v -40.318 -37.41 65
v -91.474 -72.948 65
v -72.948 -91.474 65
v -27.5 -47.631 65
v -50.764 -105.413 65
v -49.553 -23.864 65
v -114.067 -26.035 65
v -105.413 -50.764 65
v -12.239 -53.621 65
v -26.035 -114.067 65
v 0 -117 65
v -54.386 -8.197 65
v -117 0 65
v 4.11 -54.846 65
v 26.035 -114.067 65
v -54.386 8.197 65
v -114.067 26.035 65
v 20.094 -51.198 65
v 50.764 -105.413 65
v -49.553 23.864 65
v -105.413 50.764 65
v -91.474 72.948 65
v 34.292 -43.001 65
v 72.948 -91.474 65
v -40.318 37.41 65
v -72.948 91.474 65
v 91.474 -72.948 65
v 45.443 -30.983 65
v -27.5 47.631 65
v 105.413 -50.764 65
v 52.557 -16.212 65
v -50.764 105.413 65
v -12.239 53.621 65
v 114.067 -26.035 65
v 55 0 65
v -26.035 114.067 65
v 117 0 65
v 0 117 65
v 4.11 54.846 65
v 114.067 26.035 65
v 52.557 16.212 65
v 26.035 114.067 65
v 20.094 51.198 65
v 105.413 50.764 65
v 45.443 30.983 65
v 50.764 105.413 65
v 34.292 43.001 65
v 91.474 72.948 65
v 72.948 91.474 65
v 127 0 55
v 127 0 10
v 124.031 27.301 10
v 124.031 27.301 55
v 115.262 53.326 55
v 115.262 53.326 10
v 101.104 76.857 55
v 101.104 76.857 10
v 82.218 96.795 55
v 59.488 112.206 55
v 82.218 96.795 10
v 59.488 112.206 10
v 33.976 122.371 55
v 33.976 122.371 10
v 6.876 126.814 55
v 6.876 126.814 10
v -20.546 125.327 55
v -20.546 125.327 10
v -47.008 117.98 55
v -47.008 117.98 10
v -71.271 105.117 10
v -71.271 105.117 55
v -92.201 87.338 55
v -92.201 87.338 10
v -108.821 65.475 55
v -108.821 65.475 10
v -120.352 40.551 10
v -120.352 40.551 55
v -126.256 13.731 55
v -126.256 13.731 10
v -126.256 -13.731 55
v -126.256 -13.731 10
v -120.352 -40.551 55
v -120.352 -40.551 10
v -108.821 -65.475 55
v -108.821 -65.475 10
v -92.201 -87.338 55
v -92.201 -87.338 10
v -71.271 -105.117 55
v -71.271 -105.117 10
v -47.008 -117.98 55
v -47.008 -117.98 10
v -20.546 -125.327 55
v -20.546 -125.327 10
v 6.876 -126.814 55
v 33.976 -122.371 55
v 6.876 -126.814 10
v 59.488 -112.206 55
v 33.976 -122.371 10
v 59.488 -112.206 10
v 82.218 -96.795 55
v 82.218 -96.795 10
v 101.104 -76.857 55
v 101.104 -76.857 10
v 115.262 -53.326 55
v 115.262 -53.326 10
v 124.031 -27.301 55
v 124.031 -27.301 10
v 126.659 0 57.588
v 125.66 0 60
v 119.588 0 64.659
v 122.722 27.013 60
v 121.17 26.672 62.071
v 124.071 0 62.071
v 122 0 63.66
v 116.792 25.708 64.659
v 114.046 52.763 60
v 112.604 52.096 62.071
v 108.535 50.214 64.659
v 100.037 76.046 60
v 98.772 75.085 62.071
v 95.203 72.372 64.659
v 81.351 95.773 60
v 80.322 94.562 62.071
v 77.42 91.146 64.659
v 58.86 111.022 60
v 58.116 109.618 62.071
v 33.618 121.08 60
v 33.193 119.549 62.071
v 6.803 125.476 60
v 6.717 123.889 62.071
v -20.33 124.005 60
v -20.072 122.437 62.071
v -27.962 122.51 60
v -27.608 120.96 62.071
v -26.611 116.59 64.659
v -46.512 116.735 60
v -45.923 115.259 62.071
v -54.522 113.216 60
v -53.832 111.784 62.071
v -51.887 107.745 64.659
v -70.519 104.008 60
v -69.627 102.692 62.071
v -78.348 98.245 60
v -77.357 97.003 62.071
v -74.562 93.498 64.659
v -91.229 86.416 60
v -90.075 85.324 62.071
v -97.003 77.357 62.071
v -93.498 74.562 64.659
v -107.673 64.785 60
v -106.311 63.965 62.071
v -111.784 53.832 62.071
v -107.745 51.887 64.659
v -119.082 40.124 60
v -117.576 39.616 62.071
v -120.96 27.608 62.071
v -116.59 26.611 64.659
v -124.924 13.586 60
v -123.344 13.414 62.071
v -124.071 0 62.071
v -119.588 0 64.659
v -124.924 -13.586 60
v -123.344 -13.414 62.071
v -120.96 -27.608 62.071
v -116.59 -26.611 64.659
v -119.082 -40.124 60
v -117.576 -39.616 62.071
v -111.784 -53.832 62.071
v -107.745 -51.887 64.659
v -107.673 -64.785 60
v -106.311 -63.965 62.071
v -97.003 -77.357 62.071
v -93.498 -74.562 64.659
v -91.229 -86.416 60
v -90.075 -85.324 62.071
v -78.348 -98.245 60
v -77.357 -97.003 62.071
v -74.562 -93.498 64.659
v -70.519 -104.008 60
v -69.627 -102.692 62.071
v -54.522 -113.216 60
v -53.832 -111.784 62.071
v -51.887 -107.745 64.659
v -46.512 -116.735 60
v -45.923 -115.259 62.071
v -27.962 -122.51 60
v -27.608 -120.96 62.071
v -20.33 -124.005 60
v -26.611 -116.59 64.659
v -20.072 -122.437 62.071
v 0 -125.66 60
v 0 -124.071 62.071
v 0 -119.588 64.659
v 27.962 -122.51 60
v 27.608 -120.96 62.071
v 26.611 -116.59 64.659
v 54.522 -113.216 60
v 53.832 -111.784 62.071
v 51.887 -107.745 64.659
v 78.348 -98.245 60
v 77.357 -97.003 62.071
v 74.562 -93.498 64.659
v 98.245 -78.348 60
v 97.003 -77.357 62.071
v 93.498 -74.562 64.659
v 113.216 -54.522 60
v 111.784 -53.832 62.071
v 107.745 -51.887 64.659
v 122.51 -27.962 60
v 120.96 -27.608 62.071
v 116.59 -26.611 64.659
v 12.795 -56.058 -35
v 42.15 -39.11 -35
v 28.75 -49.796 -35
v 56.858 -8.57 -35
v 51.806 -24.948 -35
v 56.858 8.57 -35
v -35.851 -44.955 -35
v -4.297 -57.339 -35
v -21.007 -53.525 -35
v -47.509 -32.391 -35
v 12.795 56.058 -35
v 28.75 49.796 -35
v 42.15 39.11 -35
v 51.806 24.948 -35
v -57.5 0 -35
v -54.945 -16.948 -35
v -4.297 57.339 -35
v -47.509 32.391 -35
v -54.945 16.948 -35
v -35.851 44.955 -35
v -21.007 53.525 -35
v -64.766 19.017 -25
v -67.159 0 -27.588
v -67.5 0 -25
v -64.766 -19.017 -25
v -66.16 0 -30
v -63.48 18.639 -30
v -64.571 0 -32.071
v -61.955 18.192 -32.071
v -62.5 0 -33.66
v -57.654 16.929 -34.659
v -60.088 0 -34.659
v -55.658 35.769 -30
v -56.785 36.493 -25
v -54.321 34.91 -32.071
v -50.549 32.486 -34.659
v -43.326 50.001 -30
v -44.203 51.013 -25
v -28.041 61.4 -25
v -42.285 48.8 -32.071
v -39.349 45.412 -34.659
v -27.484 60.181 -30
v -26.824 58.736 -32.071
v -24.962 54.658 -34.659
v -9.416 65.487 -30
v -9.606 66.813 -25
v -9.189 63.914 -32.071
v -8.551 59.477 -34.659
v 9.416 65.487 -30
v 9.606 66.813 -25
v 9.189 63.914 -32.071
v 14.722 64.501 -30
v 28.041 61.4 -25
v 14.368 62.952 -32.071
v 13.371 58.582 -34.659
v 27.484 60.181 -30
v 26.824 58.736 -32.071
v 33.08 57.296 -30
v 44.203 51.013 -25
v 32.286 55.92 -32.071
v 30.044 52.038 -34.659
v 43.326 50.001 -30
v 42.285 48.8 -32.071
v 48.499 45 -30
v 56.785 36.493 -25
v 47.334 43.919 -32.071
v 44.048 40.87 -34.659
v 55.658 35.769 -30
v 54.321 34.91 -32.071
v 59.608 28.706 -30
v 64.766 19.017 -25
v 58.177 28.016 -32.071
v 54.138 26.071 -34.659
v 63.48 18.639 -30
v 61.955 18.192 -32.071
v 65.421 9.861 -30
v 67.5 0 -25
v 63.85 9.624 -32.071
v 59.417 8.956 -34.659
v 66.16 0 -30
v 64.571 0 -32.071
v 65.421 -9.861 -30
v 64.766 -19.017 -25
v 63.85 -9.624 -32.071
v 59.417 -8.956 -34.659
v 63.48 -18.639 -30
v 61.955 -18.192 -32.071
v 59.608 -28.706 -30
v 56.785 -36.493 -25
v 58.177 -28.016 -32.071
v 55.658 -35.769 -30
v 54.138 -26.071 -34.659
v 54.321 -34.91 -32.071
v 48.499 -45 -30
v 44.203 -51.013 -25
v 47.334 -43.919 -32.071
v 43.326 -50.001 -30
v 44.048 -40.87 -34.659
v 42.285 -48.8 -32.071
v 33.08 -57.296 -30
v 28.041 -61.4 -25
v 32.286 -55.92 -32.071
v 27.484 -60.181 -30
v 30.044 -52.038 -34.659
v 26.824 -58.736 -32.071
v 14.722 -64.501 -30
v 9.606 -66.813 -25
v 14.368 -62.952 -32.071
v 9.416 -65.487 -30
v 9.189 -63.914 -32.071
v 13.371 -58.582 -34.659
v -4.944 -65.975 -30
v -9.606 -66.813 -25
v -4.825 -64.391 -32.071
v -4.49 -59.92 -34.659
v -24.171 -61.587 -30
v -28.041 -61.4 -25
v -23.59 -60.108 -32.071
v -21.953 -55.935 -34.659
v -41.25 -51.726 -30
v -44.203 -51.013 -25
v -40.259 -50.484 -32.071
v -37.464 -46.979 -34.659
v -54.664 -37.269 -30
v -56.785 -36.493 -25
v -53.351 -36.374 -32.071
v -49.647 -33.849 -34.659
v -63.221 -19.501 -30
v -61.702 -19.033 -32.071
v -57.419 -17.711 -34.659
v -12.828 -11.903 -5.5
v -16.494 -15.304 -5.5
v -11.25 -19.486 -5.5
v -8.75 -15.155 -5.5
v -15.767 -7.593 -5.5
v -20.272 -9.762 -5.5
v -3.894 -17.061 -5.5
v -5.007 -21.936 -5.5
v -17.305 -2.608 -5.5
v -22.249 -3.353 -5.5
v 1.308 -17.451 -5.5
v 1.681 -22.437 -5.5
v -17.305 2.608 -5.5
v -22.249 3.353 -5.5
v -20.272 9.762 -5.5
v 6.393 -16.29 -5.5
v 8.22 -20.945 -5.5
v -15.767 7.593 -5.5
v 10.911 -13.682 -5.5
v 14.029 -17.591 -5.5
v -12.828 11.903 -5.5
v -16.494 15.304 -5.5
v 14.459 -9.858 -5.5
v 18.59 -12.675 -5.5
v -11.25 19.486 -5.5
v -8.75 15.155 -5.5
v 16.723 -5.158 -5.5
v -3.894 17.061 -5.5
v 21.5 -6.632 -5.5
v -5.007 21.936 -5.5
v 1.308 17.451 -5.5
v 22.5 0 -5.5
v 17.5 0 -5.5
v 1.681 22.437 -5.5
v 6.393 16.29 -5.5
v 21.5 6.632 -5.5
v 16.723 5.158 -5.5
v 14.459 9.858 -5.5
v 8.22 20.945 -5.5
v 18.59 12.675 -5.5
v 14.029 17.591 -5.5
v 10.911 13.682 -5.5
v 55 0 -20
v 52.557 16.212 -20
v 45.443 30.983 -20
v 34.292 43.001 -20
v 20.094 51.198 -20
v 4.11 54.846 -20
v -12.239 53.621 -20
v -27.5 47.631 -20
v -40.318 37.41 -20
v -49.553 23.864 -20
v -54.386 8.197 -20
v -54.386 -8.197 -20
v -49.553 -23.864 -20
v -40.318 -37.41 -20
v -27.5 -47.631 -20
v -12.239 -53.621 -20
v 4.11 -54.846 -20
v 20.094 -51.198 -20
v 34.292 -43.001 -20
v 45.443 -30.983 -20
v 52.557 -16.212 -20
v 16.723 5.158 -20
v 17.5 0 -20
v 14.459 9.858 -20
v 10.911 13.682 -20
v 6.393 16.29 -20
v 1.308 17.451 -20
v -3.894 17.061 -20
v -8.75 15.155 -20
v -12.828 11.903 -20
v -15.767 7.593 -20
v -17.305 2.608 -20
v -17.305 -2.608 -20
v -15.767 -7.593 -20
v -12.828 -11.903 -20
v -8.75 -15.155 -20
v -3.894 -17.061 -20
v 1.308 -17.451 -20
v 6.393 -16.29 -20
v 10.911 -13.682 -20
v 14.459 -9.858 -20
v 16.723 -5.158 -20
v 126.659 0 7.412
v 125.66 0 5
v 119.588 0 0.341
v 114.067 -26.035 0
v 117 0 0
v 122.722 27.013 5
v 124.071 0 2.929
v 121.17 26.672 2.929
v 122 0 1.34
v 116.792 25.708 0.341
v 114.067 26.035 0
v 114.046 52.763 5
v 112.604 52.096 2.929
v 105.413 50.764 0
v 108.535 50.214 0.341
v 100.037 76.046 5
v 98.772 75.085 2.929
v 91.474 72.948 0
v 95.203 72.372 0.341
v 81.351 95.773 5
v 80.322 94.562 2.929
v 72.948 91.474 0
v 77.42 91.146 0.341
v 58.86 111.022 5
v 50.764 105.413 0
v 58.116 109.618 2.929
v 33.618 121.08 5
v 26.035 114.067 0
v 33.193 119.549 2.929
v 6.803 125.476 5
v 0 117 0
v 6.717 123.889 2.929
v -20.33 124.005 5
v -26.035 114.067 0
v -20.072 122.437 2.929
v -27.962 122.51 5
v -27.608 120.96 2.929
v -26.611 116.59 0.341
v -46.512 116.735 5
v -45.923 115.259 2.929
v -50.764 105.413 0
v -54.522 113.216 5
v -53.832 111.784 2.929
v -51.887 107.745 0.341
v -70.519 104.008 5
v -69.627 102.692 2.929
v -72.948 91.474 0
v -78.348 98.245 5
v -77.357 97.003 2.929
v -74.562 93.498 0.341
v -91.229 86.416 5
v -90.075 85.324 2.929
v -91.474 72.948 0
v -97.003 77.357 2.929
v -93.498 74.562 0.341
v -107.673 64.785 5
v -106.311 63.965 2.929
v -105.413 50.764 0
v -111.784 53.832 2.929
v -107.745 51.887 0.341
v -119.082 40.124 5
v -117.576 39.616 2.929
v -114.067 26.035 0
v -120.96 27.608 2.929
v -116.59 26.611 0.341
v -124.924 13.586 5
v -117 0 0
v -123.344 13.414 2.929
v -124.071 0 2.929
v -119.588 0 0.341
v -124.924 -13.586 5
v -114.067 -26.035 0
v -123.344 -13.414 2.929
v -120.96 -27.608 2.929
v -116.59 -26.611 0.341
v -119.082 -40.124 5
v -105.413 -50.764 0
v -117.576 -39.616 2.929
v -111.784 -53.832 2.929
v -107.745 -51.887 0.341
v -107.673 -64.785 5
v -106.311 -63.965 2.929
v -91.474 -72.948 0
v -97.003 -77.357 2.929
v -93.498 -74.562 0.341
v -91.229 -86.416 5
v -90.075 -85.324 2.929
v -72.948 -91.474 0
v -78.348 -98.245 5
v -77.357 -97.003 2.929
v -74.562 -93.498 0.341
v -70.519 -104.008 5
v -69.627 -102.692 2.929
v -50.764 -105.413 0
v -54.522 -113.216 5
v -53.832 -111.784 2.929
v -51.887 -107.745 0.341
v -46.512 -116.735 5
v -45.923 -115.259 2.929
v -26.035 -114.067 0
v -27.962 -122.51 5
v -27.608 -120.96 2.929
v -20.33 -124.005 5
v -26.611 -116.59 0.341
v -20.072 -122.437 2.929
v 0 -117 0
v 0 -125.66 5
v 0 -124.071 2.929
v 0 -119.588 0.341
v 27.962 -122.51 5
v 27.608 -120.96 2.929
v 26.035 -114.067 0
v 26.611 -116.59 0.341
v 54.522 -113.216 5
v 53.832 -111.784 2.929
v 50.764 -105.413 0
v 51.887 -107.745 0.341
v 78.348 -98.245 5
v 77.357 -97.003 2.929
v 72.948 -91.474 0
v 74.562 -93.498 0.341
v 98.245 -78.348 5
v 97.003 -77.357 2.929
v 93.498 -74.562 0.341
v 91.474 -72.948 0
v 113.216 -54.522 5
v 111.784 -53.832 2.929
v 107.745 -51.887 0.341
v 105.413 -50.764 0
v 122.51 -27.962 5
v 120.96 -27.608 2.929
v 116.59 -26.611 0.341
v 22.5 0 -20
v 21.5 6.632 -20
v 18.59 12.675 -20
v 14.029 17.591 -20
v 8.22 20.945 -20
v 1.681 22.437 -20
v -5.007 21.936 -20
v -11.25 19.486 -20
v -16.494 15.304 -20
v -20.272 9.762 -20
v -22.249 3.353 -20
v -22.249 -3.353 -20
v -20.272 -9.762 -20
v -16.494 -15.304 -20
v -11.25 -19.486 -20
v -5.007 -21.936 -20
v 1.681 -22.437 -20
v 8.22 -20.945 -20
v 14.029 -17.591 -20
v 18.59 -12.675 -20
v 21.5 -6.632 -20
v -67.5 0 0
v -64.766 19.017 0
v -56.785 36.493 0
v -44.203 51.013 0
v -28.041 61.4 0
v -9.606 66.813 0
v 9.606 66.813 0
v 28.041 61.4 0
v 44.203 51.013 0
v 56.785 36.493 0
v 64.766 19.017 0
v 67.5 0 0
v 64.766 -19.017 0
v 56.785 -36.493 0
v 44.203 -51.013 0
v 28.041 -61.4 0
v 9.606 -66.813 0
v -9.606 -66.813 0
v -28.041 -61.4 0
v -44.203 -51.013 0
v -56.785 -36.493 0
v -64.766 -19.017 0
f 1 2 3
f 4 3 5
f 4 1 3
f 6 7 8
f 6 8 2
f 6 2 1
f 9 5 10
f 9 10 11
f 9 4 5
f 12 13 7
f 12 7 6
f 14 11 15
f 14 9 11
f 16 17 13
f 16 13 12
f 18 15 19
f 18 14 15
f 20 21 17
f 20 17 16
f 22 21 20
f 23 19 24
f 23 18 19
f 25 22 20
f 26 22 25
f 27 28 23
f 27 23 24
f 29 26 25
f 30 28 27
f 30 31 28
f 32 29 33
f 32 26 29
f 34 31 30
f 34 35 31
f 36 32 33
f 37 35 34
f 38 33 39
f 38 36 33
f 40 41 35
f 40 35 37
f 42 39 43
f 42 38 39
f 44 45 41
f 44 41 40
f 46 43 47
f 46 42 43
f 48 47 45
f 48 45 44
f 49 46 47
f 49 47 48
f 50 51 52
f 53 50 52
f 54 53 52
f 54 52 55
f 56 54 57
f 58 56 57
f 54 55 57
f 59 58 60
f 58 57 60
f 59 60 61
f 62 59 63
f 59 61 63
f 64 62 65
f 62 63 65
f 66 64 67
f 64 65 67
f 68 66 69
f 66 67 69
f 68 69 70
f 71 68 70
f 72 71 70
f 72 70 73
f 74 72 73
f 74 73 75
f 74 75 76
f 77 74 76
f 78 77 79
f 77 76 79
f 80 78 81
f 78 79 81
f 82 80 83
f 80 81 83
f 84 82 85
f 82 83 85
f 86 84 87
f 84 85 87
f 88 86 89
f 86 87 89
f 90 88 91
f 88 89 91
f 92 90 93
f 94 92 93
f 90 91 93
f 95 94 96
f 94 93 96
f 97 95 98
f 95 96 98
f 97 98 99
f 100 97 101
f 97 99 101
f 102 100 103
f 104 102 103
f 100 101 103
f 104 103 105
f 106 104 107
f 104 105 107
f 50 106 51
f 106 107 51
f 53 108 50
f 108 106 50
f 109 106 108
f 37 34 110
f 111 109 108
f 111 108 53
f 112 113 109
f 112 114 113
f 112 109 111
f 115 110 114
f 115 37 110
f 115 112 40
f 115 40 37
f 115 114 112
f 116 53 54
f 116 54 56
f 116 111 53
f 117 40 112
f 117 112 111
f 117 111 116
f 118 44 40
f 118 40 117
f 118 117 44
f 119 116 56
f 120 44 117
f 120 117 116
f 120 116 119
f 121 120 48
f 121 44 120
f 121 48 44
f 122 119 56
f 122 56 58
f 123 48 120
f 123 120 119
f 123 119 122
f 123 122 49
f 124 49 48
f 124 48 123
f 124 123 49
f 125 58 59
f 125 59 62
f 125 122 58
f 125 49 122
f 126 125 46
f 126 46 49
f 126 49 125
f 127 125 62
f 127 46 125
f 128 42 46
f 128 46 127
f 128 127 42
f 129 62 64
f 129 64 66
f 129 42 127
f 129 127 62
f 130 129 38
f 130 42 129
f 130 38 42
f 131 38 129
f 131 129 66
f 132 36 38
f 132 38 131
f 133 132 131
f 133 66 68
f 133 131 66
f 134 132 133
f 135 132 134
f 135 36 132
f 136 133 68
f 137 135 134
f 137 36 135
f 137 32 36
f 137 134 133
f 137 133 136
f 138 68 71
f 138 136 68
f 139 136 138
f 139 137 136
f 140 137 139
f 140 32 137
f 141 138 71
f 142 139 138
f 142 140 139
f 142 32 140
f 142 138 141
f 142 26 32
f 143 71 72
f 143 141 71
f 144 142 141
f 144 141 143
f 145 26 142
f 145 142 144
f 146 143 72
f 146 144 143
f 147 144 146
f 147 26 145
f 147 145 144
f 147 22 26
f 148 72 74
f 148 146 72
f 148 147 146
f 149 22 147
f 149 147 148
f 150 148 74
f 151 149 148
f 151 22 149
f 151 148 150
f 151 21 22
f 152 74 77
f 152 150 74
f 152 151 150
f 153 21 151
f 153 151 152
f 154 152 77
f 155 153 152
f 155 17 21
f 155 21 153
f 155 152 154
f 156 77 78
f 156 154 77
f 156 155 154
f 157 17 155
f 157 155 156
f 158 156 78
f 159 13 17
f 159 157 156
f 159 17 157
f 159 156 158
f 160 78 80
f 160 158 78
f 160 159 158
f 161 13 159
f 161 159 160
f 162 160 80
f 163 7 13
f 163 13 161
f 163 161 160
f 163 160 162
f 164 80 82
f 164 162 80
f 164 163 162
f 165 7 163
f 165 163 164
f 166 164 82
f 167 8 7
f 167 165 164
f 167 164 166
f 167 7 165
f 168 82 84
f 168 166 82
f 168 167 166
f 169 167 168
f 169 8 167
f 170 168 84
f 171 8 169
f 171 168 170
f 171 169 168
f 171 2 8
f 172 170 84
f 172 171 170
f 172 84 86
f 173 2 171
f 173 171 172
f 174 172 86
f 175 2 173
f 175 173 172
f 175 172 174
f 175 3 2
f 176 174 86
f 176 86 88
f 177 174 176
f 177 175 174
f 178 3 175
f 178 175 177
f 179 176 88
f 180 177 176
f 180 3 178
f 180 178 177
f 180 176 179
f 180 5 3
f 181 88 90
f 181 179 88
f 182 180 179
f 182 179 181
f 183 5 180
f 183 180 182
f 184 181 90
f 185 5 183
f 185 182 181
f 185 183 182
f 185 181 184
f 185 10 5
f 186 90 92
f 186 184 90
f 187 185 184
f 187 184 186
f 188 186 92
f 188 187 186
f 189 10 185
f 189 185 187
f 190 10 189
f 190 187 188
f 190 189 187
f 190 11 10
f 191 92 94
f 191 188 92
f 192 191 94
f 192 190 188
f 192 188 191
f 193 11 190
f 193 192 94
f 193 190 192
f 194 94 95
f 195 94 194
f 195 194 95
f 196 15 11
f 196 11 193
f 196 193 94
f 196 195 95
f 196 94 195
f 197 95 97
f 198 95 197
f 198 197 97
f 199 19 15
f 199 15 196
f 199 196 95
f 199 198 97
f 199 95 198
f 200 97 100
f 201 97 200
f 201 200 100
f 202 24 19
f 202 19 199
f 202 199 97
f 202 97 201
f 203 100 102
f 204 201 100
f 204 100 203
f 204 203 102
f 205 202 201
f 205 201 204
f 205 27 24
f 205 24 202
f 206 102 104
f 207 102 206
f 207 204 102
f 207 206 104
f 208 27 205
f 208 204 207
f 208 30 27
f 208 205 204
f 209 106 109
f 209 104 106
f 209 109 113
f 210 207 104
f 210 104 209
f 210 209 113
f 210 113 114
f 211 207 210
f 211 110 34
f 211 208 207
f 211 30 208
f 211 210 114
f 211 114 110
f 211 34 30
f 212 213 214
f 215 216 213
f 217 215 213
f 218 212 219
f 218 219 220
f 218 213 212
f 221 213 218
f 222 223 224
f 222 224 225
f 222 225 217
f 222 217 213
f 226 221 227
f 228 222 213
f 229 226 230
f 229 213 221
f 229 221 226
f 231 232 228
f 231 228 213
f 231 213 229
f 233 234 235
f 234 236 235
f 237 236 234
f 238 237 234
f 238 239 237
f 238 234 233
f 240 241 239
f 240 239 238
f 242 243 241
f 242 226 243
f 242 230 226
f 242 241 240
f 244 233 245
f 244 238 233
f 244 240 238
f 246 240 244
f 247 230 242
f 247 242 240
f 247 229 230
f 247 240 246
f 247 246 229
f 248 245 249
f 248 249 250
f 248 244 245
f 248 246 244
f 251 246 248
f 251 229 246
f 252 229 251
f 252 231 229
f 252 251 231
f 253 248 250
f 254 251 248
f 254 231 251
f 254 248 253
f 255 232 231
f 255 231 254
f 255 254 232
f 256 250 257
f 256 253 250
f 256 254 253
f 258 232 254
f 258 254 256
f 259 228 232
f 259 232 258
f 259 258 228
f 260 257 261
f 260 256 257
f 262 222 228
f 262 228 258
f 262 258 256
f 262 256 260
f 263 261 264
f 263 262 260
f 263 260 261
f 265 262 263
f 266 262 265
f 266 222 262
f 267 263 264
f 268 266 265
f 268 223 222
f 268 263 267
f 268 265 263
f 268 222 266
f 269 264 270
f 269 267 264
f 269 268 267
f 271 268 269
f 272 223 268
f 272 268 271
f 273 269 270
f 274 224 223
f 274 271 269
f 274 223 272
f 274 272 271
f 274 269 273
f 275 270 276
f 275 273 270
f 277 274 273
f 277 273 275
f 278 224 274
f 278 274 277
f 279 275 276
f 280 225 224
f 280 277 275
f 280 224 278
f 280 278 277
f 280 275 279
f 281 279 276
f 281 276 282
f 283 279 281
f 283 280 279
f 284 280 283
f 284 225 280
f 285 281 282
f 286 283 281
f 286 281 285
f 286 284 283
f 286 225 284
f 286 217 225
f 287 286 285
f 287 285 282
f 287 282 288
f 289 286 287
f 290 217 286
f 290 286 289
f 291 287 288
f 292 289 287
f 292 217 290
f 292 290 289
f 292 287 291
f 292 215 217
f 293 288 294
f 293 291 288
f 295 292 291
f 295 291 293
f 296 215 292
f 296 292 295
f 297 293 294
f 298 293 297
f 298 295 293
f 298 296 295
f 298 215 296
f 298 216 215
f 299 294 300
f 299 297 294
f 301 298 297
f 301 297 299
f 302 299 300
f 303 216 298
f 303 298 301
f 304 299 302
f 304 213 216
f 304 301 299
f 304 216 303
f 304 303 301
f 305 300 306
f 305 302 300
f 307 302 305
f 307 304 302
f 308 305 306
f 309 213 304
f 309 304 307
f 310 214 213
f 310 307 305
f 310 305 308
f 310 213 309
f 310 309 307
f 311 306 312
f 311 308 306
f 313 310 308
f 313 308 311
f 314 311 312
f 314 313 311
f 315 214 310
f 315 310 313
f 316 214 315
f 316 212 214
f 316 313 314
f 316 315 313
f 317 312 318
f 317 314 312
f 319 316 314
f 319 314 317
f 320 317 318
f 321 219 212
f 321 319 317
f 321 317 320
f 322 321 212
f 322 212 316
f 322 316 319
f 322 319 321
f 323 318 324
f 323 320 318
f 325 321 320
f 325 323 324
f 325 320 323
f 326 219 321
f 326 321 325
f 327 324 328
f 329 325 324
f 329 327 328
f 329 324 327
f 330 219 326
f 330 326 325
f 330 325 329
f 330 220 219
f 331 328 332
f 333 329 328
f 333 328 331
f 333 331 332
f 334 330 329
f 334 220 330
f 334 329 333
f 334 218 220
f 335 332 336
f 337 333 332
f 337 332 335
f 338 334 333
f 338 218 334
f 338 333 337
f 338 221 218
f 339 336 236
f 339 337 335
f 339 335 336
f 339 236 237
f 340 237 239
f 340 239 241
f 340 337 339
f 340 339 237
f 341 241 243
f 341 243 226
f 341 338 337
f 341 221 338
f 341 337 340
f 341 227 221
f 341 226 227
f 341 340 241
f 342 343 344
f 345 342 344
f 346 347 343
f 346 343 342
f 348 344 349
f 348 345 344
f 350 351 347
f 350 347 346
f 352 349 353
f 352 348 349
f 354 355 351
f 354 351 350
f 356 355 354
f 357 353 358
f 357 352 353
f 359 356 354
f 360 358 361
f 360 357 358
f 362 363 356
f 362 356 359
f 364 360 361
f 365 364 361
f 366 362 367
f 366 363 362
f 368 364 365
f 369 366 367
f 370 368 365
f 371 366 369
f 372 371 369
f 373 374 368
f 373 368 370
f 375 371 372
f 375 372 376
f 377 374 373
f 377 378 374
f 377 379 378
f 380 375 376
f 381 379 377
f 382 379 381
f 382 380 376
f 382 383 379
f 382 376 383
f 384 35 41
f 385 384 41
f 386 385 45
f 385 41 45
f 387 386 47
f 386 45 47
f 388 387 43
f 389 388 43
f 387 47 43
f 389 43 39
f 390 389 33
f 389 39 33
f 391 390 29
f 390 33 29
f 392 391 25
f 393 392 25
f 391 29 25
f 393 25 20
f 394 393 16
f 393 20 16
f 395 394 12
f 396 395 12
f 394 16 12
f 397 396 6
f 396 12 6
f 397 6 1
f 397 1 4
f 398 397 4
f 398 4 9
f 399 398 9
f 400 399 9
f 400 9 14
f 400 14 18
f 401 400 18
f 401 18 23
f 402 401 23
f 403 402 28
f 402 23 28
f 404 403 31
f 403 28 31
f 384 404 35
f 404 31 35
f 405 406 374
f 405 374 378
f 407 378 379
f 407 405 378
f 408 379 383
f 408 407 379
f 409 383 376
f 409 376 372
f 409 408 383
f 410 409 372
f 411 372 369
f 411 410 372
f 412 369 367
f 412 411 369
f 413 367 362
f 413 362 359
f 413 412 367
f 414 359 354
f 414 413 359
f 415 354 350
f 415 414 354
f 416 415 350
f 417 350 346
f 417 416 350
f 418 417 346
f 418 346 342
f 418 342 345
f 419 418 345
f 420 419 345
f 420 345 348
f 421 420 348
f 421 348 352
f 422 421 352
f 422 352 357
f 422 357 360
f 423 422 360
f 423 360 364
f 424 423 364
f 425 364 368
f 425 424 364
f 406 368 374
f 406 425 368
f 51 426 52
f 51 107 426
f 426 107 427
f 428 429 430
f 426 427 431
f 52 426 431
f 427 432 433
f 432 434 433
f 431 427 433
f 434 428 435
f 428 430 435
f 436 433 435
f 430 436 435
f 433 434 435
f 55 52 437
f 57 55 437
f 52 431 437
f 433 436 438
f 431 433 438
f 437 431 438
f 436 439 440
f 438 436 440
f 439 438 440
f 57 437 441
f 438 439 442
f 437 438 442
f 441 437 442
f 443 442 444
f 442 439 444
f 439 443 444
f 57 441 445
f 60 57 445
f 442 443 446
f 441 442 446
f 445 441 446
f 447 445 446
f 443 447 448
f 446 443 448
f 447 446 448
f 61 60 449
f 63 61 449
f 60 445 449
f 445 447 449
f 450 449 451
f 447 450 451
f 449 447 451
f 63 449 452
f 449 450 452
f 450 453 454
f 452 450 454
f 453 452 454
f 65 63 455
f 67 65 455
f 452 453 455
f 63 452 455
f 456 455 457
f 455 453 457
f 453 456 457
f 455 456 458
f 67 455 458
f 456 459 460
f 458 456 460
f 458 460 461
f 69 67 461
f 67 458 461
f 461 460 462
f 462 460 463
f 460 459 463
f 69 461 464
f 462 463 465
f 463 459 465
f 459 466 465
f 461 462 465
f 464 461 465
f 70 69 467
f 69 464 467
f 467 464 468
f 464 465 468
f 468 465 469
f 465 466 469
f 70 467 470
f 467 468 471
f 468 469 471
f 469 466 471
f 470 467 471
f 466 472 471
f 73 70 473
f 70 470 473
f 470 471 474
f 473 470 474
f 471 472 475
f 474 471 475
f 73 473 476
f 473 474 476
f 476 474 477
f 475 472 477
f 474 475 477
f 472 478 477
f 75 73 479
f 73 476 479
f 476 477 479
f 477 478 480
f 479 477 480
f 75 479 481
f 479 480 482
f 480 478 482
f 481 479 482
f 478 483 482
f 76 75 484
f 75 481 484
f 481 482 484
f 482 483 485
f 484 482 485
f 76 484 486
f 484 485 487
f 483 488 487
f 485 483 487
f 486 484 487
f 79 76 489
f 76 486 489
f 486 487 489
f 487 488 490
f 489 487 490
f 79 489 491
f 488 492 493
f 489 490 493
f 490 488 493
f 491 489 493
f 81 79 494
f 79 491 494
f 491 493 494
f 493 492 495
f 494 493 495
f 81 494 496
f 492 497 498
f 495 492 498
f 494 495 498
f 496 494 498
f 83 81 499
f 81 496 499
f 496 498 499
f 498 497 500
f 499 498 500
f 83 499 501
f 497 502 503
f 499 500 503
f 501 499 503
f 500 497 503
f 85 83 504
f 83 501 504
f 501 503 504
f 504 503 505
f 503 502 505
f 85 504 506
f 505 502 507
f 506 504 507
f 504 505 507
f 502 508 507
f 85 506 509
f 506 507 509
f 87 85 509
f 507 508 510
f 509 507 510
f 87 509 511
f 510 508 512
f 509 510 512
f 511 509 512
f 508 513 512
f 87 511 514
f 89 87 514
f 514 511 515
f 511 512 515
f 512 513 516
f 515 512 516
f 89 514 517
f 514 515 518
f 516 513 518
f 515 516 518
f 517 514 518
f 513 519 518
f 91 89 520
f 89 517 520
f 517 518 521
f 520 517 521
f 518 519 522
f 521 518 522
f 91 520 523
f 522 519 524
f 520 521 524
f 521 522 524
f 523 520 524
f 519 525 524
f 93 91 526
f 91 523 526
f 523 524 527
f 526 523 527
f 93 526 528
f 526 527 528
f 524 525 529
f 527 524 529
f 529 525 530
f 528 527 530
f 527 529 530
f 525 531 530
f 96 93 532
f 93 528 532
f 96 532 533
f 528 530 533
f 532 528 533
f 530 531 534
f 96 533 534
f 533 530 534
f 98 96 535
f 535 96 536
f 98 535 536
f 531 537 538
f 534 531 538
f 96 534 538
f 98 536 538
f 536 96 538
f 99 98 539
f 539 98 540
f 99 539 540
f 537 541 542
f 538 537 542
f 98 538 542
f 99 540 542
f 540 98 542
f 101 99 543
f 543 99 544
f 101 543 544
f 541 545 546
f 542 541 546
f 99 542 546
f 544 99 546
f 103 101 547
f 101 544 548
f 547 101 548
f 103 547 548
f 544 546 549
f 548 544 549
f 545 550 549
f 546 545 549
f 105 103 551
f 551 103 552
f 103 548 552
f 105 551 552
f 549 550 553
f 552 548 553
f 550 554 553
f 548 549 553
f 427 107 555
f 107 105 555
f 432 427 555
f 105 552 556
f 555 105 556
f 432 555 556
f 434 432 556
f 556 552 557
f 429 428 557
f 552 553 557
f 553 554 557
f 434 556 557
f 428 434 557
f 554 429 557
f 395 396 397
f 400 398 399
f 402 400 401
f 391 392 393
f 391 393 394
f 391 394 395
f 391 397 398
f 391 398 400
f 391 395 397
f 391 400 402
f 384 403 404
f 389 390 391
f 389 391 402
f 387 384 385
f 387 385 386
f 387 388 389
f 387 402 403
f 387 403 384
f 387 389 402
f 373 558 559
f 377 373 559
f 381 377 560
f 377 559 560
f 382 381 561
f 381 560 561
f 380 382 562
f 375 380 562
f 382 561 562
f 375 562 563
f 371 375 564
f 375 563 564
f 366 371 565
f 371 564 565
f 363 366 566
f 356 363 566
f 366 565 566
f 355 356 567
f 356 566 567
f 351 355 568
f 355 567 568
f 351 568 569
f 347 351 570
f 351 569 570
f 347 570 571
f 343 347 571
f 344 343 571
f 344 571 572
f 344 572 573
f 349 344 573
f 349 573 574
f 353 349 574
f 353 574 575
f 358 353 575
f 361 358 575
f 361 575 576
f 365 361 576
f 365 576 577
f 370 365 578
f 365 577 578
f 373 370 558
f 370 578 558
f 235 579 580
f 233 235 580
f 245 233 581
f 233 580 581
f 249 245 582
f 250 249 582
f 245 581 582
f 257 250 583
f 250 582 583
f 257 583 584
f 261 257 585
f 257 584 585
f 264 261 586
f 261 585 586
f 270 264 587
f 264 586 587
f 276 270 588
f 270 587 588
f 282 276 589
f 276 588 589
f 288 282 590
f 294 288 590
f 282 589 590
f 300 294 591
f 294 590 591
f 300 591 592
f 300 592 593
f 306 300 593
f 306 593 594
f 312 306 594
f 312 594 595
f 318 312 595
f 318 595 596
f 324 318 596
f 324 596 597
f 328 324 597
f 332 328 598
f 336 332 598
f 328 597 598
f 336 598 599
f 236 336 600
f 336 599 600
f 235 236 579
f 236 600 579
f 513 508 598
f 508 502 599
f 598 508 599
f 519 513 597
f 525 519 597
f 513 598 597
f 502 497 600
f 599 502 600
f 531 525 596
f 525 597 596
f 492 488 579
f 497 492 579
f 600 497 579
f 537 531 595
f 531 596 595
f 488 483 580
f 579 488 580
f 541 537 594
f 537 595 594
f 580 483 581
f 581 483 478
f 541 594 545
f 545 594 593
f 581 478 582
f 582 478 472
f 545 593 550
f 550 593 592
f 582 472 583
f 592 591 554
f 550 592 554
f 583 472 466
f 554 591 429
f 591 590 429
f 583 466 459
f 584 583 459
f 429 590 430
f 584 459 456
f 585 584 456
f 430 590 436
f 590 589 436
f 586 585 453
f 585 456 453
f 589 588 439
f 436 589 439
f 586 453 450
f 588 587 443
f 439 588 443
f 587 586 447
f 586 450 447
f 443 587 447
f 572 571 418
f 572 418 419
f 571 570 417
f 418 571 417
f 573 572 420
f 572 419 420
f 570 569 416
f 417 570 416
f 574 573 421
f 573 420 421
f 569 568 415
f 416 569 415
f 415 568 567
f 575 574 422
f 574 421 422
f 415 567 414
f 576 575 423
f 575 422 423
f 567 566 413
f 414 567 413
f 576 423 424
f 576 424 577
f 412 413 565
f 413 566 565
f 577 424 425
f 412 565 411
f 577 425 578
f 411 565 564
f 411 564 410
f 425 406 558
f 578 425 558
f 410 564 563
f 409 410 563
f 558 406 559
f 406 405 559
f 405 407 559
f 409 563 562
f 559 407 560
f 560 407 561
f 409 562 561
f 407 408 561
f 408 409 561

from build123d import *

# Parameters (mm, degrees)
SKETCH1_R                 = 127
TIRE_DEPTH                = 65
FILLET1_R                 = 10
SKETCH5_R                 = 67.5
TIRE_RIM_EXTRUSION_DEPTH  = 35
FILLET4_R                 = 10
SKETCH6_R                 = 55
TIRE_HOLLOW_CUT_DEPTH     = 85
SKETCH7_R                 = 22.5
SKETCH7_R_2               = 17.5
TIRE_SPLINE_HOUSING_DEPTH = 14.5


with BuildPart() as part:
    # Sketch1 → Tire (new body)
    with BuildSketch(Plane.XY):
        Circle(SKETCH1_R)
    extrude(amount=TIRE_DEPTH)

    # Fillet1
    fillet1_edges = [part.edges().sort_by_distance(p)[0] for p in [
        (-127, 0, 0),
        (-127, 0, 65),
    ]]
    fillet(fillet1_edges, radius=FILLET1_R)

    # Sketch5 → Tire_Rim_Extrusion (add)
    with BuildSketch(Plane(origin=(0, 0, 0), x_dir=(-1, 0, 0), z_dir=(0, 0, -1))):
        Circle(SKETCH5_R)
    extrude(amount=TIRE_RIM_EXTRUSION_DEPTH)

    # Fillet4
    fillet4_edges = [part.edges().sort_by_distance(p)[0] for p in [
        (67.5, 0, -35),
    ]]
    fillet(fillet4_edges, radius=FILLET4_R)

    # Sketch6 → Tire_Hollow_Cut (cut)
    with BuildSketch(Plane.XY.offset(65)):
        Circle(SKETCH6_R)
    extrude(amount=-TIRE_HOLLOW_CUT_DEPTH, mode=Mode.SUBTRACT)


with BuildPart() as body_2:
    # Sketch7 → Tire_Spline_Housing (new body)
    with BuildSketch(Plane.XY.offset(-20)):
        Circle(SKETCH7_R)
        Circle(SKETCH7_R_2, mode=Mode.SUBTRACT)
    extrude(amount=TIRE_SPLINE_HOUSING_DEPTH)


solid = Compound([part.part, body_2.part])
